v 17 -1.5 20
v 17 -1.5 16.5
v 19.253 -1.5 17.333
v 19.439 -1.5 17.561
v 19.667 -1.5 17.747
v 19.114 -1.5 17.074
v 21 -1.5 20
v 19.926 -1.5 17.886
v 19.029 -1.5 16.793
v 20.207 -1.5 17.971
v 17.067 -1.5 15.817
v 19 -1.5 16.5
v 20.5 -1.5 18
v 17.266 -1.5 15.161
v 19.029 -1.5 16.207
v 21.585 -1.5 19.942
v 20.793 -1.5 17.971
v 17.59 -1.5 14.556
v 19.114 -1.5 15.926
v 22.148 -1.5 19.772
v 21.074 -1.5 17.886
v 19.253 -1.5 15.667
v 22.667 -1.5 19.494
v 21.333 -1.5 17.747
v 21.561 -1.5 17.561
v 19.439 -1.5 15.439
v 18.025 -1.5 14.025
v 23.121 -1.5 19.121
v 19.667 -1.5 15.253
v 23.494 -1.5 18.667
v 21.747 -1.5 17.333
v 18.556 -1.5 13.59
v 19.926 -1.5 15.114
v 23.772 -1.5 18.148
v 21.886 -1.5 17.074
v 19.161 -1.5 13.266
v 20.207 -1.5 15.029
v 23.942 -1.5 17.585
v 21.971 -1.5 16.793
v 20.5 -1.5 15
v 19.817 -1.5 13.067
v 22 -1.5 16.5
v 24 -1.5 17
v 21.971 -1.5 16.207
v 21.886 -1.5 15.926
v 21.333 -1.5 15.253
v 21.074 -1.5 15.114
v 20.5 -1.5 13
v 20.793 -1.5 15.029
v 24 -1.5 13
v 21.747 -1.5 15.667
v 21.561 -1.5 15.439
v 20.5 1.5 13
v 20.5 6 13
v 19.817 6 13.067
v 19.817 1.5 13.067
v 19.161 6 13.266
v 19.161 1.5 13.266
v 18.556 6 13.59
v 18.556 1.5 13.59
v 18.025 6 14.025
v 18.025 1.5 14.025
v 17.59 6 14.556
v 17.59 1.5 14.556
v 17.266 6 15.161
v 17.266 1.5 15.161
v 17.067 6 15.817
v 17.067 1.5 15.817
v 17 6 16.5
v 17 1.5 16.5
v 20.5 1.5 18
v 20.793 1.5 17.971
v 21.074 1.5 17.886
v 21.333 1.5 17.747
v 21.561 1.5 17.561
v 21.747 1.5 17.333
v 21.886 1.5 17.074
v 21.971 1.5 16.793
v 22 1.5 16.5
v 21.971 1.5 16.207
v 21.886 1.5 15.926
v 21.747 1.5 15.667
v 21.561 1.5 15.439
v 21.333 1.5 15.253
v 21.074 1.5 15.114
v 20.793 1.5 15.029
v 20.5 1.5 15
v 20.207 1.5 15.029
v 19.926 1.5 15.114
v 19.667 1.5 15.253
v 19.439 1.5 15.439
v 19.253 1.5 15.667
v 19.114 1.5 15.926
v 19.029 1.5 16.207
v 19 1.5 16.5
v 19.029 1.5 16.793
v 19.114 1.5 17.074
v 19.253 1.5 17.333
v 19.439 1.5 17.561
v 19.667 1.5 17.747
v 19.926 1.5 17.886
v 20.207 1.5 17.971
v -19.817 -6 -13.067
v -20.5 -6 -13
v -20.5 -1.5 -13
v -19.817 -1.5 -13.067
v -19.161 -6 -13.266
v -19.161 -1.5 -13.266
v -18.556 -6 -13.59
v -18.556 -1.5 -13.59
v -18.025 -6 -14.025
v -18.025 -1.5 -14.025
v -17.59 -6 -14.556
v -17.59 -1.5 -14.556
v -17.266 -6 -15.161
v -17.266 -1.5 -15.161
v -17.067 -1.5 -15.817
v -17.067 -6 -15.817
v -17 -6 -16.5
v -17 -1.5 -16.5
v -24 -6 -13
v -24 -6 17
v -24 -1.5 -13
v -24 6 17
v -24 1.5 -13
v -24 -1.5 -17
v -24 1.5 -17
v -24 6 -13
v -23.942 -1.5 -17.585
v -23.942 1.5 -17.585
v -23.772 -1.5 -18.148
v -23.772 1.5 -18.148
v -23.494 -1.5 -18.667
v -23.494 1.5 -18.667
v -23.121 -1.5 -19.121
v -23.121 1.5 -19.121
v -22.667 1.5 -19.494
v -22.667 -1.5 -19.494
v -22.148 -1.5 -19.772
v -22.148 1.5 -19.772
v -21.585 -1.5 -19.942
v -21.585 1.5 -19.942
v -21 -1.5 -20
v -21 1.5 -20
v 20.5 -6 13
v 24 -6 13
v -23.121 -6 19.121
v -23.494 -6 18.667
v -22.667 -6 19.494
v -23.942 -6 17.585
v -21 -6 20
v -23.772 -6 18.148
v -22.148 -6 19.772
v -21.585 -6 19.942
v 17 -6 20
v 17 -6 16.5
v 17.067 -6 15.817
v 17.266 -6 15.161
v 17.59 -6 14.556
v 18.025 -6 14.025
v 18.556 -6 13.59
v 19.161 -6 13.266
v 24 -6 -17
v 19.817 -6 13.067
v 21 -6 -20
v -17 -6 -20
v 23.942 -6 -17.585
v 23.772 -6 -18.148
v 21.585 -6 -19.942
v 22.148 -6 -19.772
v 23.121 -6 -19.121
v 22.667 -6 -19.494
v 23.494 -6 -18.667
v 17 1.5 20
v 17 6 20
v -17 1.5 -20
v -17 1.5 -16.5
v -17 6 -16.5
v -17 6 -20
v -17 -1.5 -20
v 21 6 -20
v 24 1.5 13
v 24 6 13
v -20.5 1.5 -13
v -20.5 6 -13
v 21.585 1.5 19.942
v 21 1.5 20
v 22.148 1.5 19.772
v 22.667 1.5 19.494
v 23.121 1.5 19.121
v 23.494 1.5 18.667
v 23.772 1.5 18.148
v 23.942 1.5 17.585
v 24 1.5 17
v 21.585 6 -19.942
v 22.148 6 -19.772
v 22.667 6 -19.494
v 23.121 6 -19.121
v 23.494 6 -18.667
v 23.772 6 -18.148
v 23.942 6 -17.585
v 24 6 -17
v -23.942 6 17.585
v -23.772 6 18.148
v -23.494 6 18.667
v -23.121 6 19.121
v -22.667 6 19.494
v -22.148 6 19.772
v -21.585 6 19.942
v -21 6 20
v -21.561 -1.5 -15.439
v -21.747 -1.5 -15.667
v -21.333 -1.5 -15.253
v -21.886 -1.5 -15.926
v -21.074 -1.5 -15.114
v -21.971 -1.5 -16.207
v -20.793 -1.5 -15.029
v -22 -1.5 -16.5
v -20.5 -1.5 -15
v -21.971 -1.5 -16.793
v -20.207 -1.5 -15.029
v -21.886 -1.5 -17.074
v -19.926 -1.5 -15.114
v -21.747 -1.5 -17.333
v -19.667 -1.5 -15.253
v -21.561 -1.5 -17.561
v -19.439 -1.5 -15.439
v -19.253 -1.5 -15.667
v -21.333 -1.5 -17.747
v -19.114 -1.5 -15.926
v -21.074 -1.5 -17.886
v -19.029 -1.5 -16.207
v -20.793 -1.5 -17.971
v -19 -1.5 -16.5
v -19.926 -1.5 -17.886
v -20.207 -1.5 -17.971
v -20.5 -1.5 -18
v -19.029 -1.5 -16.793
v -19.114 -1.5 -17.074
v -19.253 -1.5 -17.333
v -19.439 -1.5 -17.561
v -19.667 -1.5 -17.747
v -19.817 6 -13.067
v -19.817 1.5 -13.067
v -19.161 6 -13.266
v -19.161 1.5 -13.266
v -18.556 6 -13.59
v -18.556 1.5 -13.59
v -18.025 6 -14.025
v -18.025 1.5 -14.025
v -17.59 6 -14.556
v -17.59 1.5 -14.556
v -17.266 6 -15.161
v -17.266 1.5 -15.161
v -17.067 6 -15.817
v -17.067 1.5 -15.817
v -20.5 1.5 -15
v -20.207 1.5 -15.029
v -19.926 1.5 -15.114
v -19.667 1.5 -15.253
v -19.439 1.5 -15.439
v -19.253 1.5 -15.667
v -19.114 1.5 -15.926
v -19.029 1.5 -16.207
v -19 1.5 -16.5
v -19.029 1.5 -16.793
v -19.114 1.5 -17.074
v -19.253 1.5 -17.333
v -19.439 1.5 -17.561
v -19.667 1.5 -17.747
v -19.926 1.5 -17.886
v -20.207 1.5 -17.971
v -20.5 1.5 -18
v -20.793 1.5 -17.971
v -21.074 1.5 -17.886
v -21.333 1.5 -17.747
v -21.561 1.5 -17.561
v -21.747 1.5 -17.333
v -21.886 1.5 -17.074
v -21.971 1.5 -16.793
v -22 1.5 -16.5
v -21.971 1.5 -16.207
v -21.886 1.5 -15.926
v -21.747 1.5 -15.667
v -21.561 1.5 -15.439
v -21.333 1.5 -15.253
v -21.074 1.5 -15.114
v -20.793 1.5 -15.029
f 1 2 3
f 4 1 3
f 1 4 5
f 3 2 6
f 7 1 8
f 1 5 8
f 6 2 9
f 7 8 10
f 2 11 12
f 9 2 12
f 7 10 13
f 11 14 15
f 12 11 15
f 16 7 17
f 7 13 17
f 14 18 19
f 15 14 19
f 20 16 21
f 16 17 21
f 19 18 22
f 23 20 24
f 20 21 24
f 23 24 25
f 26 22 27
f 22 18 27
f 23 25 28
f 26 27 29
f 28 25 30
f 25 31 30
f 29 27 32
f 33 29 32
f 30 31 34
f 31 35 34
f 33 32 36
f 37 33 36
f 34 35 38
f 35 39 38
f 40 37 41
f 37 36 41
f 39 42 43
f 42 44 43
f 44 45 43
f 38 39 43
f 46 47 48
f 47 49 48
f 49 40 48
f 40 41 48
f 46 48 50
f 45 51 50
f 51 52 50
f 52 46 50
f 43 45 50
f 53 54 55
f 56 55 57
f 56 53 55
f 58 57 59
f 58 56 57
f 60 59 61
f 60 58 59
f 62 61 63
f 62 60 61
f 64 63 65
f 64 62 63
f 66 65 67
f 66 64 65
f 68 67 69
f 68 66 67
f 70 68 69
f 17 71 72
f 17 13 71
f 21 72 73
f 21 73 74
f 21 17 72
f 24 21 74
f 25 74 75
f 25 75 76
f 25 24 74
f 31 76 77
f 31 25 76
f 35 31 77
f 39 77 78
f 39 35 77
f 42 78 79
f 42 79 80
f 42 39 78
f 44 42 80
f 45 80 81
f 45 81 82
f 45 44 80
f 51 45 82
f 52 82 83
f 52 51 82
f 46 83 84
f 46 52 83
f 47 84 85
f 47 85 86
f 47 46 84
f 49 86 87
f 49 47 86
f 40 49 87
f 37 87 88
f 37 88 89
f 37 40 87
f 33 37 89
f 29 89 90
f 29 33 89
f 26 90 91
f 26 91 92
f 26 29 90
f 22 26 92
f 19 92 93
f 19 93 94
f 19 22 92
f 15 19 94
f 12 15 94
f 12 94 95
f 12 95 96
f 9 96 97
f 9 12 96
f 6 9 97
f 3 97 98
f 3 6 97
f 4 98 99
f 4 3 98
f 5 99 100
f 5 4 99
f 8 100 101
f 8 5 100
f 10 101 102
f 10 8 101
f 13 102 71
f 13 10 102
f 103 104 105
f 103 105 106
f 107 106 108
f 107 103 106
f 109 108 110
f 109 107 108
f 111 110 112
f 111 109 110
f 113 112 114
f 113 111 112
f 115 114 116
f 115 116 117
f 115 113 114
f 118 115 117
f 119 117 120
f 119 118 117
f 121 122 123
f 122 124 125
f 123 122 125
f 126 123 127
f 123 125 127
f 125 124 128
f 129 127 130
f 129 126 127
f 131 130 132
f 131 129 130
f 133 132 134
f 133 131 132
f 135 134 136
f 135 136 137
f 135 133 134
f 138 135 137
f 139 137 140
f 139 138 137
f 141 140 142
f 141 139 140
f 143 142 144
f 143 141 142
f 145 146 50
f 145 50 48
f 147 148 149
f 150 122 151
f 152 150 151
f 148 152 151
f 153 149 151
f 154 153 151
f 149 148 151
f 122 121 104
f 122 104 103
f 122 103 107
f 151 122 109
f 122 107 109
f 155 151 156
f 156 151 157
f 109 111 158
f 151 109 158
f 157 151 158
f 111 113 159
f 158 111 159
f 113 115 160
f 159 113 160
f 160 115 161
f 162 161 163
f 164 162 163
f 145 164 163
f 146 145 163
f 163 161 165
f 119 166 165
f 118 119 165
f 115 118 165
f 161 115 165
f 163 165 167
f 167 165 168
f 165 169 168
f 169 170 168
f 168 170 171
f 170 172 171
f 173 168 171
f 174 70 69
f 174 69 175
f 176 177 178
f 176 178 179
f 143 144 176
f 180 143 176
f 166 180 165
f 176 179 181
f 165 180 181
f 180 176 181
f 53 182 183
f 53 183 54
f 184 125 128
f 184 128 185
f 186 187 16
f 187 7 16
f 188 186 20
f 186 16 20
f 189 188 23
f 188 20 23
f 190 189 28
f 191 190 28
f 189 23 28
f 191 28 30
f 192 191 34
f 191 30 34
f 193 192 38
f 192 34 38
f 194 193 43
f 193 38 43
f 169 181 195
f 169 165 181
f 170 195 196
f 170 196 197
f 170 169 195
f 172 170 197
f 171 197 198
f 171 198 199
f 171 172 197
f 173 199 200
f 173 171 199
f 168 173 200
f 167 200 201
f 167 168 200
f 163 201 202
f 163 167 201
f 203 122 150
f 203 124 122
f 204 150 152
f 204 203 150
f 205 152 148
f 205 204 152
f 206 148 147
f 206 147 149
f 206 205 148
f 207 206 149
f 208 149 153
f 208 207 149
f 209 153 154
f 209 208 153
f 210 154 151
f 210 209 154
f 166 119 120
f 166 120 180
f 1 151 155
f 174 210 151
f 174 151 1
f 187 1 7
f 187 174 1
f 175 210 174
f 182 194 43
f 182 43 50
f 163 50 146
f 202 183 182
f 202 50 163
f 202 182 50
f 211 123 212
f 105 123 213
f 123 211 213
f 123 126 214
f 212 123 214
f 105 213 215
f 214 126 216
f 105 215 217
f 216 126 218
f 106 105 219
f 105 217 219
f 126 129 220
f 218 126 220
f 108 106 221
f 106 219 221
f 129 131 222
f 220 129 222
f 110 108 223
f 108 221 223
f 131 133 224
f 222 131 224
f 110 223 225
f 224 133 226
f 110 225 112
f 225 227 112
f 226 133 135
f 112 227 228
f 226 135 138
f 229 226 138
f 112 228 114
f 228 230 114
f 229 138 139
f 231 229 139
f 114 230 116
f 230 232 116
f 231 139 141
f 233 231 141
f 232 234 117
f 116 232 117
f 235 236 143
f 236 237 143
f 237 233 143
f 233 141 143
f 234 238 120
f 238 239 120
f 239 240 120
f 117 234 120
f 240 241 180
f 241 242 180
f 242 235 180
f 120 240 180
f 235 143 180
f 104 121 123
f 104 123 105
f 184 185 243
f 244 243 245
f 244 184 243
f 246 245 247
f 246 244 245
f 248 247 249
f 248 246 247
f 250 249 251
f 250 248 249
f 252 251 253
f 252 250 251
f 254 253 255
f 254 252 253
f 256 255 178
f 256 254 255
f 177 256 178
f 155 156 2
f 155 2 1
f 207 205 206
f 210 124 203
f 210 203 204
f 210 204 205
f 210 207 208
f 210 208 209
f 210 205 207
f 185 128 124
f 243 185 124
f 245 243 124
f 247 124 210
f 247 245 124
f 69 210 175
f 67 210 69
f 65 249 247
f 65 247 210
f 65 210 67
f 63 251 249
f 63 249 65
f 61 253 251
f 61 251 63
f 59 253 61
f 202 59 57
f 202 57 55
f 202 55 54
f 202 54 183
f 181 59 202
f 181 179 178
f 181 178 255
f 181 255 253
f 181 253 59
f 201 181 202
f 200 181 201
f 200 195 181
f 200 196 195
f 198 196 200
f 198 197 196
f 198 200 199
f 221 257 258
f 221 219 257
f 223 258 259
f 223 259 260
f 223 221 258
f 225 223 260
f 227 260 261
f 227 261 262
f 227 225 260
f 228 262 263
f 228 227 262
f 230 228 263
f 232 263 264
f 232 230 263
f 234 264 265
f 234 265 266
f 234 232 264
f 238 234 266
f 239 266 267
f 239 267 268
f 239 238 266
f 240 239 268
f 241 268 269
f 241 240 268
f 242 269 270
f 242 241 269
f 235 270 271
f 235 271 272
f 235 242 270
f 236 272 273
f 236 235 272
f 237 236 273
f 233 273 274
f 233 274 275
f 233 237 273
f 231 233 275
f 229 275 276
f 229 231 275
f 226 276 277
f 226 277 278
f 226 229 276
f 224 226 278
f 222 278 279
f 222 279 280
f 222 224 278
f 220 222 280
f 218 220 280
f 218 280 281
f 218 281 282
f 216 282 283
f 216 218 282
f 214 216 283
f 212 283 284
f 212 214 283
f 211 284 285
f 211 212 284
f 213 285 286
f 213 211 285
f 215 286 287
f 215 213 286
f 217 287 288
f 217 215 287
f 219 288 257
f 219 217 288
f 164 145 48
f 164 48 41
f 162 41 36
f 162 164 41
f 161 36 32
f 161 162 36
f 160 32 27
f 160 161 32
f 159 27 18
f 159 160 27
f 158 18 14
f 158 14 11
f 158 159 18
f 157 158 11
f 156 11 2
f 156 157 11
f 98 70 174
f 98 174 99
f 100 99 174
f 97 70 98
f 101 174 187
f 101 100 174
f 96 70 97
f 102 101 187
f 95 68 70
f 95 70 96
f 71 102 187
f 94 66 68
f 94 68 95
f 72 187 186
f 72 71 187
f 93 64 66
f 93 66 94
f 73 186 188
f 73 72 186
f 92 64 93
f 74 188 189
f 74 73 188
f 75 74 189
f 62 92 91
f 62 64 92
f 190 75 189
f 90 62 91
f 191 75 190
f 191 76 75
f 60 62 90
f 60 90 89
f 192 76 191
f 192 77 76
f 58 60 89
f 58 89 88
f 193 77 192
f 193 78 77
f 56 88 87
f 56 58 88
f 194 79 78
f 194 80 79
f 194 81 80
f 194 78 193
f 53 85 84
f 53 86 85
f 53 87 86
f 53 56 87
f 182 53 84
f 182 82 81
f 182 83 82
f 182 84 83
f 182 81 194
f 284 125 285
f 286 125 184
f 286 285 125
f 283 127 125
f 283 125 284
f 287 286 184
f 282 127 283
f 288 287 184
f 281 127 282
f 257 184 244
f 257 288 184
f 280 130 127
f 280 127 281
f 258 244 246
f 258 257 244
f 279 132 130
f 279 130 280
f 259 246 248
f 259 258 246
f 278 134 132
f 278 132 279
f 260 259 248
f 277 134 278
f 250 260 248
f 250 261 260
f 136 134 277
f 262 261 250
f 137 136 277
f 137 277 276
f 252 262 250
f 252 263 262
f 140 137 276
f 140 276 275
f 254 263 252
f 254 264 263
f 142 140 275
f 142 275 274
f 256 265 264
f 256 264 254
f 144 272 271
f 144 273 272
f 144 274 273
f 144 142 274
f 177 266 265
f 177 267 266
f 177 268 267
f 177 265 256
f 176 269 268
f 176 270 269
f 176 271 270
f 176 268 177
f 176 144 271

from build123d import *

# Parameters (mm, degrees)
SKETCH1_W               = 48
SKETCH1_H               = 40
BOSS_EXTRUDE1_DEPTH     = 6
CUT_EXTRUDE1_DEPTH      = 34.466401061
CUT_EXTRUDE1_DEPTH_BACK = 34.466401061
SKETCH3_R               = 1.5
BOSS_EXTRUDE2_DEPTH     = 1.5
FILLET1_R               = 3


with BuildPart() as part:
    # Sketch1 → Boss-Extrude1 (new, symmetric)
    with BuildSketch(Plane(origin=(0, 0, 0), x_dir=(1, 0, 0), z_dir=(0, 1, 0))):
        Rectangle(SKETCH1_W, SKETCH1_H)
    extrude(amount=BOSS_EXTRUDE1_DEPTH, both=True)

    # Sketch2 → Cut-Extrude1 (cut, two sides: drawn at the far end of the back side and taken through both)
    with BuildSketch(Plane(origin=(0, 6, 0), x_dir=(1, 0, 0), z_dir=(0, 1, 0)).offset(-CUT_EXTRUDE1_DEPTH_BACK)):
        with BuildLine():
            Line((-24, 13), (-20.5, 13))
            ThreePointArc((-20.5, 13), (-18.025126266, 14.025126266), (-17, 16.5))
            Line((-17, 16.5), (-17, 20))
            Line((-17, 20), (-24, 20))
            Line((-24, 20), (-24, 13))
        make_face()
        with BuildLine():
            Line((24, -13), (20.5, -13))
            ThreePointArc((20.5, -13), (18.025126266, -14.025126266), (17, -16.5))
            Line((17, -16.5), (17, -20))
            Line((17, -20), (24, -20))
            Line((24, -20), (24, -13))
        make_face()
    extrude(amount=CUT_EXTRUDE1_DEPTH + CUT_EXTRUDE1_DEPTH_BACK, mode=Mode.SUBTRACT)

    # Sketch3 → Boss-Extrude2 (add, symmetric)
    # profile 1 of 2: a face of its own
    with BuildSketch(Plane(origin=(0, 0, 0), x_dir=(1, 0, 0), z_dir=(0, 1, 0))):
        with BuildLine():
            Line((24, -13), (20.5, -13))
            ThreePointArc((20.5, -13), (18.025126266, -14.025126266), (17, -16.5))
            Line((17, -16.5), (17, -20))
            Line((17, -20), (24, -20))
            Line((24, -20), (24, -13))
        make_face()
        with Locations(Location((20.5, -16.5, 0), (0, 0, 270))):
            Circle(SKETCH3_R, mode=Mode.SUBTRACT)
    # profile 2 of 2: a face of its own
    with BuildSketch(Plane(origin=(0, 0, 0), x_dir=(1, 0, 0), z_dir=(0, 1, 0))):
        with BuildLine():
            Line((-24, 13), (-20.5, 13))
            ThreePointArc((-20.5, 13), (-18.025126266, 14.025126266), (-17, 16.5))
            Line((-17, 16.5), (-17, 20))
            Line((-17, 20), (-24, 20))
            Line((-24, 20), (-24, 13))
        make_face()
        with Locations(Location((-20.5, 16.5, 0), (0, 0, 270))):
            Circle(SKETCH3_R, mode=Mode.SUBTRACT)
    extrude(amount=BOSS_EXTRUDE2_DEPTH, both=True)

    # Fillet1
    fillet1_edges = [part.edges().sort_by_distance(p)[0] for p in [
        (24, 0, 20),
        (-24, 0, 20),
        (24, 0, -20),
        (-24, 0, -20),
    ]]
    fillet(fillet1_edges, radius=FILLET1_R)


solid = part.part
